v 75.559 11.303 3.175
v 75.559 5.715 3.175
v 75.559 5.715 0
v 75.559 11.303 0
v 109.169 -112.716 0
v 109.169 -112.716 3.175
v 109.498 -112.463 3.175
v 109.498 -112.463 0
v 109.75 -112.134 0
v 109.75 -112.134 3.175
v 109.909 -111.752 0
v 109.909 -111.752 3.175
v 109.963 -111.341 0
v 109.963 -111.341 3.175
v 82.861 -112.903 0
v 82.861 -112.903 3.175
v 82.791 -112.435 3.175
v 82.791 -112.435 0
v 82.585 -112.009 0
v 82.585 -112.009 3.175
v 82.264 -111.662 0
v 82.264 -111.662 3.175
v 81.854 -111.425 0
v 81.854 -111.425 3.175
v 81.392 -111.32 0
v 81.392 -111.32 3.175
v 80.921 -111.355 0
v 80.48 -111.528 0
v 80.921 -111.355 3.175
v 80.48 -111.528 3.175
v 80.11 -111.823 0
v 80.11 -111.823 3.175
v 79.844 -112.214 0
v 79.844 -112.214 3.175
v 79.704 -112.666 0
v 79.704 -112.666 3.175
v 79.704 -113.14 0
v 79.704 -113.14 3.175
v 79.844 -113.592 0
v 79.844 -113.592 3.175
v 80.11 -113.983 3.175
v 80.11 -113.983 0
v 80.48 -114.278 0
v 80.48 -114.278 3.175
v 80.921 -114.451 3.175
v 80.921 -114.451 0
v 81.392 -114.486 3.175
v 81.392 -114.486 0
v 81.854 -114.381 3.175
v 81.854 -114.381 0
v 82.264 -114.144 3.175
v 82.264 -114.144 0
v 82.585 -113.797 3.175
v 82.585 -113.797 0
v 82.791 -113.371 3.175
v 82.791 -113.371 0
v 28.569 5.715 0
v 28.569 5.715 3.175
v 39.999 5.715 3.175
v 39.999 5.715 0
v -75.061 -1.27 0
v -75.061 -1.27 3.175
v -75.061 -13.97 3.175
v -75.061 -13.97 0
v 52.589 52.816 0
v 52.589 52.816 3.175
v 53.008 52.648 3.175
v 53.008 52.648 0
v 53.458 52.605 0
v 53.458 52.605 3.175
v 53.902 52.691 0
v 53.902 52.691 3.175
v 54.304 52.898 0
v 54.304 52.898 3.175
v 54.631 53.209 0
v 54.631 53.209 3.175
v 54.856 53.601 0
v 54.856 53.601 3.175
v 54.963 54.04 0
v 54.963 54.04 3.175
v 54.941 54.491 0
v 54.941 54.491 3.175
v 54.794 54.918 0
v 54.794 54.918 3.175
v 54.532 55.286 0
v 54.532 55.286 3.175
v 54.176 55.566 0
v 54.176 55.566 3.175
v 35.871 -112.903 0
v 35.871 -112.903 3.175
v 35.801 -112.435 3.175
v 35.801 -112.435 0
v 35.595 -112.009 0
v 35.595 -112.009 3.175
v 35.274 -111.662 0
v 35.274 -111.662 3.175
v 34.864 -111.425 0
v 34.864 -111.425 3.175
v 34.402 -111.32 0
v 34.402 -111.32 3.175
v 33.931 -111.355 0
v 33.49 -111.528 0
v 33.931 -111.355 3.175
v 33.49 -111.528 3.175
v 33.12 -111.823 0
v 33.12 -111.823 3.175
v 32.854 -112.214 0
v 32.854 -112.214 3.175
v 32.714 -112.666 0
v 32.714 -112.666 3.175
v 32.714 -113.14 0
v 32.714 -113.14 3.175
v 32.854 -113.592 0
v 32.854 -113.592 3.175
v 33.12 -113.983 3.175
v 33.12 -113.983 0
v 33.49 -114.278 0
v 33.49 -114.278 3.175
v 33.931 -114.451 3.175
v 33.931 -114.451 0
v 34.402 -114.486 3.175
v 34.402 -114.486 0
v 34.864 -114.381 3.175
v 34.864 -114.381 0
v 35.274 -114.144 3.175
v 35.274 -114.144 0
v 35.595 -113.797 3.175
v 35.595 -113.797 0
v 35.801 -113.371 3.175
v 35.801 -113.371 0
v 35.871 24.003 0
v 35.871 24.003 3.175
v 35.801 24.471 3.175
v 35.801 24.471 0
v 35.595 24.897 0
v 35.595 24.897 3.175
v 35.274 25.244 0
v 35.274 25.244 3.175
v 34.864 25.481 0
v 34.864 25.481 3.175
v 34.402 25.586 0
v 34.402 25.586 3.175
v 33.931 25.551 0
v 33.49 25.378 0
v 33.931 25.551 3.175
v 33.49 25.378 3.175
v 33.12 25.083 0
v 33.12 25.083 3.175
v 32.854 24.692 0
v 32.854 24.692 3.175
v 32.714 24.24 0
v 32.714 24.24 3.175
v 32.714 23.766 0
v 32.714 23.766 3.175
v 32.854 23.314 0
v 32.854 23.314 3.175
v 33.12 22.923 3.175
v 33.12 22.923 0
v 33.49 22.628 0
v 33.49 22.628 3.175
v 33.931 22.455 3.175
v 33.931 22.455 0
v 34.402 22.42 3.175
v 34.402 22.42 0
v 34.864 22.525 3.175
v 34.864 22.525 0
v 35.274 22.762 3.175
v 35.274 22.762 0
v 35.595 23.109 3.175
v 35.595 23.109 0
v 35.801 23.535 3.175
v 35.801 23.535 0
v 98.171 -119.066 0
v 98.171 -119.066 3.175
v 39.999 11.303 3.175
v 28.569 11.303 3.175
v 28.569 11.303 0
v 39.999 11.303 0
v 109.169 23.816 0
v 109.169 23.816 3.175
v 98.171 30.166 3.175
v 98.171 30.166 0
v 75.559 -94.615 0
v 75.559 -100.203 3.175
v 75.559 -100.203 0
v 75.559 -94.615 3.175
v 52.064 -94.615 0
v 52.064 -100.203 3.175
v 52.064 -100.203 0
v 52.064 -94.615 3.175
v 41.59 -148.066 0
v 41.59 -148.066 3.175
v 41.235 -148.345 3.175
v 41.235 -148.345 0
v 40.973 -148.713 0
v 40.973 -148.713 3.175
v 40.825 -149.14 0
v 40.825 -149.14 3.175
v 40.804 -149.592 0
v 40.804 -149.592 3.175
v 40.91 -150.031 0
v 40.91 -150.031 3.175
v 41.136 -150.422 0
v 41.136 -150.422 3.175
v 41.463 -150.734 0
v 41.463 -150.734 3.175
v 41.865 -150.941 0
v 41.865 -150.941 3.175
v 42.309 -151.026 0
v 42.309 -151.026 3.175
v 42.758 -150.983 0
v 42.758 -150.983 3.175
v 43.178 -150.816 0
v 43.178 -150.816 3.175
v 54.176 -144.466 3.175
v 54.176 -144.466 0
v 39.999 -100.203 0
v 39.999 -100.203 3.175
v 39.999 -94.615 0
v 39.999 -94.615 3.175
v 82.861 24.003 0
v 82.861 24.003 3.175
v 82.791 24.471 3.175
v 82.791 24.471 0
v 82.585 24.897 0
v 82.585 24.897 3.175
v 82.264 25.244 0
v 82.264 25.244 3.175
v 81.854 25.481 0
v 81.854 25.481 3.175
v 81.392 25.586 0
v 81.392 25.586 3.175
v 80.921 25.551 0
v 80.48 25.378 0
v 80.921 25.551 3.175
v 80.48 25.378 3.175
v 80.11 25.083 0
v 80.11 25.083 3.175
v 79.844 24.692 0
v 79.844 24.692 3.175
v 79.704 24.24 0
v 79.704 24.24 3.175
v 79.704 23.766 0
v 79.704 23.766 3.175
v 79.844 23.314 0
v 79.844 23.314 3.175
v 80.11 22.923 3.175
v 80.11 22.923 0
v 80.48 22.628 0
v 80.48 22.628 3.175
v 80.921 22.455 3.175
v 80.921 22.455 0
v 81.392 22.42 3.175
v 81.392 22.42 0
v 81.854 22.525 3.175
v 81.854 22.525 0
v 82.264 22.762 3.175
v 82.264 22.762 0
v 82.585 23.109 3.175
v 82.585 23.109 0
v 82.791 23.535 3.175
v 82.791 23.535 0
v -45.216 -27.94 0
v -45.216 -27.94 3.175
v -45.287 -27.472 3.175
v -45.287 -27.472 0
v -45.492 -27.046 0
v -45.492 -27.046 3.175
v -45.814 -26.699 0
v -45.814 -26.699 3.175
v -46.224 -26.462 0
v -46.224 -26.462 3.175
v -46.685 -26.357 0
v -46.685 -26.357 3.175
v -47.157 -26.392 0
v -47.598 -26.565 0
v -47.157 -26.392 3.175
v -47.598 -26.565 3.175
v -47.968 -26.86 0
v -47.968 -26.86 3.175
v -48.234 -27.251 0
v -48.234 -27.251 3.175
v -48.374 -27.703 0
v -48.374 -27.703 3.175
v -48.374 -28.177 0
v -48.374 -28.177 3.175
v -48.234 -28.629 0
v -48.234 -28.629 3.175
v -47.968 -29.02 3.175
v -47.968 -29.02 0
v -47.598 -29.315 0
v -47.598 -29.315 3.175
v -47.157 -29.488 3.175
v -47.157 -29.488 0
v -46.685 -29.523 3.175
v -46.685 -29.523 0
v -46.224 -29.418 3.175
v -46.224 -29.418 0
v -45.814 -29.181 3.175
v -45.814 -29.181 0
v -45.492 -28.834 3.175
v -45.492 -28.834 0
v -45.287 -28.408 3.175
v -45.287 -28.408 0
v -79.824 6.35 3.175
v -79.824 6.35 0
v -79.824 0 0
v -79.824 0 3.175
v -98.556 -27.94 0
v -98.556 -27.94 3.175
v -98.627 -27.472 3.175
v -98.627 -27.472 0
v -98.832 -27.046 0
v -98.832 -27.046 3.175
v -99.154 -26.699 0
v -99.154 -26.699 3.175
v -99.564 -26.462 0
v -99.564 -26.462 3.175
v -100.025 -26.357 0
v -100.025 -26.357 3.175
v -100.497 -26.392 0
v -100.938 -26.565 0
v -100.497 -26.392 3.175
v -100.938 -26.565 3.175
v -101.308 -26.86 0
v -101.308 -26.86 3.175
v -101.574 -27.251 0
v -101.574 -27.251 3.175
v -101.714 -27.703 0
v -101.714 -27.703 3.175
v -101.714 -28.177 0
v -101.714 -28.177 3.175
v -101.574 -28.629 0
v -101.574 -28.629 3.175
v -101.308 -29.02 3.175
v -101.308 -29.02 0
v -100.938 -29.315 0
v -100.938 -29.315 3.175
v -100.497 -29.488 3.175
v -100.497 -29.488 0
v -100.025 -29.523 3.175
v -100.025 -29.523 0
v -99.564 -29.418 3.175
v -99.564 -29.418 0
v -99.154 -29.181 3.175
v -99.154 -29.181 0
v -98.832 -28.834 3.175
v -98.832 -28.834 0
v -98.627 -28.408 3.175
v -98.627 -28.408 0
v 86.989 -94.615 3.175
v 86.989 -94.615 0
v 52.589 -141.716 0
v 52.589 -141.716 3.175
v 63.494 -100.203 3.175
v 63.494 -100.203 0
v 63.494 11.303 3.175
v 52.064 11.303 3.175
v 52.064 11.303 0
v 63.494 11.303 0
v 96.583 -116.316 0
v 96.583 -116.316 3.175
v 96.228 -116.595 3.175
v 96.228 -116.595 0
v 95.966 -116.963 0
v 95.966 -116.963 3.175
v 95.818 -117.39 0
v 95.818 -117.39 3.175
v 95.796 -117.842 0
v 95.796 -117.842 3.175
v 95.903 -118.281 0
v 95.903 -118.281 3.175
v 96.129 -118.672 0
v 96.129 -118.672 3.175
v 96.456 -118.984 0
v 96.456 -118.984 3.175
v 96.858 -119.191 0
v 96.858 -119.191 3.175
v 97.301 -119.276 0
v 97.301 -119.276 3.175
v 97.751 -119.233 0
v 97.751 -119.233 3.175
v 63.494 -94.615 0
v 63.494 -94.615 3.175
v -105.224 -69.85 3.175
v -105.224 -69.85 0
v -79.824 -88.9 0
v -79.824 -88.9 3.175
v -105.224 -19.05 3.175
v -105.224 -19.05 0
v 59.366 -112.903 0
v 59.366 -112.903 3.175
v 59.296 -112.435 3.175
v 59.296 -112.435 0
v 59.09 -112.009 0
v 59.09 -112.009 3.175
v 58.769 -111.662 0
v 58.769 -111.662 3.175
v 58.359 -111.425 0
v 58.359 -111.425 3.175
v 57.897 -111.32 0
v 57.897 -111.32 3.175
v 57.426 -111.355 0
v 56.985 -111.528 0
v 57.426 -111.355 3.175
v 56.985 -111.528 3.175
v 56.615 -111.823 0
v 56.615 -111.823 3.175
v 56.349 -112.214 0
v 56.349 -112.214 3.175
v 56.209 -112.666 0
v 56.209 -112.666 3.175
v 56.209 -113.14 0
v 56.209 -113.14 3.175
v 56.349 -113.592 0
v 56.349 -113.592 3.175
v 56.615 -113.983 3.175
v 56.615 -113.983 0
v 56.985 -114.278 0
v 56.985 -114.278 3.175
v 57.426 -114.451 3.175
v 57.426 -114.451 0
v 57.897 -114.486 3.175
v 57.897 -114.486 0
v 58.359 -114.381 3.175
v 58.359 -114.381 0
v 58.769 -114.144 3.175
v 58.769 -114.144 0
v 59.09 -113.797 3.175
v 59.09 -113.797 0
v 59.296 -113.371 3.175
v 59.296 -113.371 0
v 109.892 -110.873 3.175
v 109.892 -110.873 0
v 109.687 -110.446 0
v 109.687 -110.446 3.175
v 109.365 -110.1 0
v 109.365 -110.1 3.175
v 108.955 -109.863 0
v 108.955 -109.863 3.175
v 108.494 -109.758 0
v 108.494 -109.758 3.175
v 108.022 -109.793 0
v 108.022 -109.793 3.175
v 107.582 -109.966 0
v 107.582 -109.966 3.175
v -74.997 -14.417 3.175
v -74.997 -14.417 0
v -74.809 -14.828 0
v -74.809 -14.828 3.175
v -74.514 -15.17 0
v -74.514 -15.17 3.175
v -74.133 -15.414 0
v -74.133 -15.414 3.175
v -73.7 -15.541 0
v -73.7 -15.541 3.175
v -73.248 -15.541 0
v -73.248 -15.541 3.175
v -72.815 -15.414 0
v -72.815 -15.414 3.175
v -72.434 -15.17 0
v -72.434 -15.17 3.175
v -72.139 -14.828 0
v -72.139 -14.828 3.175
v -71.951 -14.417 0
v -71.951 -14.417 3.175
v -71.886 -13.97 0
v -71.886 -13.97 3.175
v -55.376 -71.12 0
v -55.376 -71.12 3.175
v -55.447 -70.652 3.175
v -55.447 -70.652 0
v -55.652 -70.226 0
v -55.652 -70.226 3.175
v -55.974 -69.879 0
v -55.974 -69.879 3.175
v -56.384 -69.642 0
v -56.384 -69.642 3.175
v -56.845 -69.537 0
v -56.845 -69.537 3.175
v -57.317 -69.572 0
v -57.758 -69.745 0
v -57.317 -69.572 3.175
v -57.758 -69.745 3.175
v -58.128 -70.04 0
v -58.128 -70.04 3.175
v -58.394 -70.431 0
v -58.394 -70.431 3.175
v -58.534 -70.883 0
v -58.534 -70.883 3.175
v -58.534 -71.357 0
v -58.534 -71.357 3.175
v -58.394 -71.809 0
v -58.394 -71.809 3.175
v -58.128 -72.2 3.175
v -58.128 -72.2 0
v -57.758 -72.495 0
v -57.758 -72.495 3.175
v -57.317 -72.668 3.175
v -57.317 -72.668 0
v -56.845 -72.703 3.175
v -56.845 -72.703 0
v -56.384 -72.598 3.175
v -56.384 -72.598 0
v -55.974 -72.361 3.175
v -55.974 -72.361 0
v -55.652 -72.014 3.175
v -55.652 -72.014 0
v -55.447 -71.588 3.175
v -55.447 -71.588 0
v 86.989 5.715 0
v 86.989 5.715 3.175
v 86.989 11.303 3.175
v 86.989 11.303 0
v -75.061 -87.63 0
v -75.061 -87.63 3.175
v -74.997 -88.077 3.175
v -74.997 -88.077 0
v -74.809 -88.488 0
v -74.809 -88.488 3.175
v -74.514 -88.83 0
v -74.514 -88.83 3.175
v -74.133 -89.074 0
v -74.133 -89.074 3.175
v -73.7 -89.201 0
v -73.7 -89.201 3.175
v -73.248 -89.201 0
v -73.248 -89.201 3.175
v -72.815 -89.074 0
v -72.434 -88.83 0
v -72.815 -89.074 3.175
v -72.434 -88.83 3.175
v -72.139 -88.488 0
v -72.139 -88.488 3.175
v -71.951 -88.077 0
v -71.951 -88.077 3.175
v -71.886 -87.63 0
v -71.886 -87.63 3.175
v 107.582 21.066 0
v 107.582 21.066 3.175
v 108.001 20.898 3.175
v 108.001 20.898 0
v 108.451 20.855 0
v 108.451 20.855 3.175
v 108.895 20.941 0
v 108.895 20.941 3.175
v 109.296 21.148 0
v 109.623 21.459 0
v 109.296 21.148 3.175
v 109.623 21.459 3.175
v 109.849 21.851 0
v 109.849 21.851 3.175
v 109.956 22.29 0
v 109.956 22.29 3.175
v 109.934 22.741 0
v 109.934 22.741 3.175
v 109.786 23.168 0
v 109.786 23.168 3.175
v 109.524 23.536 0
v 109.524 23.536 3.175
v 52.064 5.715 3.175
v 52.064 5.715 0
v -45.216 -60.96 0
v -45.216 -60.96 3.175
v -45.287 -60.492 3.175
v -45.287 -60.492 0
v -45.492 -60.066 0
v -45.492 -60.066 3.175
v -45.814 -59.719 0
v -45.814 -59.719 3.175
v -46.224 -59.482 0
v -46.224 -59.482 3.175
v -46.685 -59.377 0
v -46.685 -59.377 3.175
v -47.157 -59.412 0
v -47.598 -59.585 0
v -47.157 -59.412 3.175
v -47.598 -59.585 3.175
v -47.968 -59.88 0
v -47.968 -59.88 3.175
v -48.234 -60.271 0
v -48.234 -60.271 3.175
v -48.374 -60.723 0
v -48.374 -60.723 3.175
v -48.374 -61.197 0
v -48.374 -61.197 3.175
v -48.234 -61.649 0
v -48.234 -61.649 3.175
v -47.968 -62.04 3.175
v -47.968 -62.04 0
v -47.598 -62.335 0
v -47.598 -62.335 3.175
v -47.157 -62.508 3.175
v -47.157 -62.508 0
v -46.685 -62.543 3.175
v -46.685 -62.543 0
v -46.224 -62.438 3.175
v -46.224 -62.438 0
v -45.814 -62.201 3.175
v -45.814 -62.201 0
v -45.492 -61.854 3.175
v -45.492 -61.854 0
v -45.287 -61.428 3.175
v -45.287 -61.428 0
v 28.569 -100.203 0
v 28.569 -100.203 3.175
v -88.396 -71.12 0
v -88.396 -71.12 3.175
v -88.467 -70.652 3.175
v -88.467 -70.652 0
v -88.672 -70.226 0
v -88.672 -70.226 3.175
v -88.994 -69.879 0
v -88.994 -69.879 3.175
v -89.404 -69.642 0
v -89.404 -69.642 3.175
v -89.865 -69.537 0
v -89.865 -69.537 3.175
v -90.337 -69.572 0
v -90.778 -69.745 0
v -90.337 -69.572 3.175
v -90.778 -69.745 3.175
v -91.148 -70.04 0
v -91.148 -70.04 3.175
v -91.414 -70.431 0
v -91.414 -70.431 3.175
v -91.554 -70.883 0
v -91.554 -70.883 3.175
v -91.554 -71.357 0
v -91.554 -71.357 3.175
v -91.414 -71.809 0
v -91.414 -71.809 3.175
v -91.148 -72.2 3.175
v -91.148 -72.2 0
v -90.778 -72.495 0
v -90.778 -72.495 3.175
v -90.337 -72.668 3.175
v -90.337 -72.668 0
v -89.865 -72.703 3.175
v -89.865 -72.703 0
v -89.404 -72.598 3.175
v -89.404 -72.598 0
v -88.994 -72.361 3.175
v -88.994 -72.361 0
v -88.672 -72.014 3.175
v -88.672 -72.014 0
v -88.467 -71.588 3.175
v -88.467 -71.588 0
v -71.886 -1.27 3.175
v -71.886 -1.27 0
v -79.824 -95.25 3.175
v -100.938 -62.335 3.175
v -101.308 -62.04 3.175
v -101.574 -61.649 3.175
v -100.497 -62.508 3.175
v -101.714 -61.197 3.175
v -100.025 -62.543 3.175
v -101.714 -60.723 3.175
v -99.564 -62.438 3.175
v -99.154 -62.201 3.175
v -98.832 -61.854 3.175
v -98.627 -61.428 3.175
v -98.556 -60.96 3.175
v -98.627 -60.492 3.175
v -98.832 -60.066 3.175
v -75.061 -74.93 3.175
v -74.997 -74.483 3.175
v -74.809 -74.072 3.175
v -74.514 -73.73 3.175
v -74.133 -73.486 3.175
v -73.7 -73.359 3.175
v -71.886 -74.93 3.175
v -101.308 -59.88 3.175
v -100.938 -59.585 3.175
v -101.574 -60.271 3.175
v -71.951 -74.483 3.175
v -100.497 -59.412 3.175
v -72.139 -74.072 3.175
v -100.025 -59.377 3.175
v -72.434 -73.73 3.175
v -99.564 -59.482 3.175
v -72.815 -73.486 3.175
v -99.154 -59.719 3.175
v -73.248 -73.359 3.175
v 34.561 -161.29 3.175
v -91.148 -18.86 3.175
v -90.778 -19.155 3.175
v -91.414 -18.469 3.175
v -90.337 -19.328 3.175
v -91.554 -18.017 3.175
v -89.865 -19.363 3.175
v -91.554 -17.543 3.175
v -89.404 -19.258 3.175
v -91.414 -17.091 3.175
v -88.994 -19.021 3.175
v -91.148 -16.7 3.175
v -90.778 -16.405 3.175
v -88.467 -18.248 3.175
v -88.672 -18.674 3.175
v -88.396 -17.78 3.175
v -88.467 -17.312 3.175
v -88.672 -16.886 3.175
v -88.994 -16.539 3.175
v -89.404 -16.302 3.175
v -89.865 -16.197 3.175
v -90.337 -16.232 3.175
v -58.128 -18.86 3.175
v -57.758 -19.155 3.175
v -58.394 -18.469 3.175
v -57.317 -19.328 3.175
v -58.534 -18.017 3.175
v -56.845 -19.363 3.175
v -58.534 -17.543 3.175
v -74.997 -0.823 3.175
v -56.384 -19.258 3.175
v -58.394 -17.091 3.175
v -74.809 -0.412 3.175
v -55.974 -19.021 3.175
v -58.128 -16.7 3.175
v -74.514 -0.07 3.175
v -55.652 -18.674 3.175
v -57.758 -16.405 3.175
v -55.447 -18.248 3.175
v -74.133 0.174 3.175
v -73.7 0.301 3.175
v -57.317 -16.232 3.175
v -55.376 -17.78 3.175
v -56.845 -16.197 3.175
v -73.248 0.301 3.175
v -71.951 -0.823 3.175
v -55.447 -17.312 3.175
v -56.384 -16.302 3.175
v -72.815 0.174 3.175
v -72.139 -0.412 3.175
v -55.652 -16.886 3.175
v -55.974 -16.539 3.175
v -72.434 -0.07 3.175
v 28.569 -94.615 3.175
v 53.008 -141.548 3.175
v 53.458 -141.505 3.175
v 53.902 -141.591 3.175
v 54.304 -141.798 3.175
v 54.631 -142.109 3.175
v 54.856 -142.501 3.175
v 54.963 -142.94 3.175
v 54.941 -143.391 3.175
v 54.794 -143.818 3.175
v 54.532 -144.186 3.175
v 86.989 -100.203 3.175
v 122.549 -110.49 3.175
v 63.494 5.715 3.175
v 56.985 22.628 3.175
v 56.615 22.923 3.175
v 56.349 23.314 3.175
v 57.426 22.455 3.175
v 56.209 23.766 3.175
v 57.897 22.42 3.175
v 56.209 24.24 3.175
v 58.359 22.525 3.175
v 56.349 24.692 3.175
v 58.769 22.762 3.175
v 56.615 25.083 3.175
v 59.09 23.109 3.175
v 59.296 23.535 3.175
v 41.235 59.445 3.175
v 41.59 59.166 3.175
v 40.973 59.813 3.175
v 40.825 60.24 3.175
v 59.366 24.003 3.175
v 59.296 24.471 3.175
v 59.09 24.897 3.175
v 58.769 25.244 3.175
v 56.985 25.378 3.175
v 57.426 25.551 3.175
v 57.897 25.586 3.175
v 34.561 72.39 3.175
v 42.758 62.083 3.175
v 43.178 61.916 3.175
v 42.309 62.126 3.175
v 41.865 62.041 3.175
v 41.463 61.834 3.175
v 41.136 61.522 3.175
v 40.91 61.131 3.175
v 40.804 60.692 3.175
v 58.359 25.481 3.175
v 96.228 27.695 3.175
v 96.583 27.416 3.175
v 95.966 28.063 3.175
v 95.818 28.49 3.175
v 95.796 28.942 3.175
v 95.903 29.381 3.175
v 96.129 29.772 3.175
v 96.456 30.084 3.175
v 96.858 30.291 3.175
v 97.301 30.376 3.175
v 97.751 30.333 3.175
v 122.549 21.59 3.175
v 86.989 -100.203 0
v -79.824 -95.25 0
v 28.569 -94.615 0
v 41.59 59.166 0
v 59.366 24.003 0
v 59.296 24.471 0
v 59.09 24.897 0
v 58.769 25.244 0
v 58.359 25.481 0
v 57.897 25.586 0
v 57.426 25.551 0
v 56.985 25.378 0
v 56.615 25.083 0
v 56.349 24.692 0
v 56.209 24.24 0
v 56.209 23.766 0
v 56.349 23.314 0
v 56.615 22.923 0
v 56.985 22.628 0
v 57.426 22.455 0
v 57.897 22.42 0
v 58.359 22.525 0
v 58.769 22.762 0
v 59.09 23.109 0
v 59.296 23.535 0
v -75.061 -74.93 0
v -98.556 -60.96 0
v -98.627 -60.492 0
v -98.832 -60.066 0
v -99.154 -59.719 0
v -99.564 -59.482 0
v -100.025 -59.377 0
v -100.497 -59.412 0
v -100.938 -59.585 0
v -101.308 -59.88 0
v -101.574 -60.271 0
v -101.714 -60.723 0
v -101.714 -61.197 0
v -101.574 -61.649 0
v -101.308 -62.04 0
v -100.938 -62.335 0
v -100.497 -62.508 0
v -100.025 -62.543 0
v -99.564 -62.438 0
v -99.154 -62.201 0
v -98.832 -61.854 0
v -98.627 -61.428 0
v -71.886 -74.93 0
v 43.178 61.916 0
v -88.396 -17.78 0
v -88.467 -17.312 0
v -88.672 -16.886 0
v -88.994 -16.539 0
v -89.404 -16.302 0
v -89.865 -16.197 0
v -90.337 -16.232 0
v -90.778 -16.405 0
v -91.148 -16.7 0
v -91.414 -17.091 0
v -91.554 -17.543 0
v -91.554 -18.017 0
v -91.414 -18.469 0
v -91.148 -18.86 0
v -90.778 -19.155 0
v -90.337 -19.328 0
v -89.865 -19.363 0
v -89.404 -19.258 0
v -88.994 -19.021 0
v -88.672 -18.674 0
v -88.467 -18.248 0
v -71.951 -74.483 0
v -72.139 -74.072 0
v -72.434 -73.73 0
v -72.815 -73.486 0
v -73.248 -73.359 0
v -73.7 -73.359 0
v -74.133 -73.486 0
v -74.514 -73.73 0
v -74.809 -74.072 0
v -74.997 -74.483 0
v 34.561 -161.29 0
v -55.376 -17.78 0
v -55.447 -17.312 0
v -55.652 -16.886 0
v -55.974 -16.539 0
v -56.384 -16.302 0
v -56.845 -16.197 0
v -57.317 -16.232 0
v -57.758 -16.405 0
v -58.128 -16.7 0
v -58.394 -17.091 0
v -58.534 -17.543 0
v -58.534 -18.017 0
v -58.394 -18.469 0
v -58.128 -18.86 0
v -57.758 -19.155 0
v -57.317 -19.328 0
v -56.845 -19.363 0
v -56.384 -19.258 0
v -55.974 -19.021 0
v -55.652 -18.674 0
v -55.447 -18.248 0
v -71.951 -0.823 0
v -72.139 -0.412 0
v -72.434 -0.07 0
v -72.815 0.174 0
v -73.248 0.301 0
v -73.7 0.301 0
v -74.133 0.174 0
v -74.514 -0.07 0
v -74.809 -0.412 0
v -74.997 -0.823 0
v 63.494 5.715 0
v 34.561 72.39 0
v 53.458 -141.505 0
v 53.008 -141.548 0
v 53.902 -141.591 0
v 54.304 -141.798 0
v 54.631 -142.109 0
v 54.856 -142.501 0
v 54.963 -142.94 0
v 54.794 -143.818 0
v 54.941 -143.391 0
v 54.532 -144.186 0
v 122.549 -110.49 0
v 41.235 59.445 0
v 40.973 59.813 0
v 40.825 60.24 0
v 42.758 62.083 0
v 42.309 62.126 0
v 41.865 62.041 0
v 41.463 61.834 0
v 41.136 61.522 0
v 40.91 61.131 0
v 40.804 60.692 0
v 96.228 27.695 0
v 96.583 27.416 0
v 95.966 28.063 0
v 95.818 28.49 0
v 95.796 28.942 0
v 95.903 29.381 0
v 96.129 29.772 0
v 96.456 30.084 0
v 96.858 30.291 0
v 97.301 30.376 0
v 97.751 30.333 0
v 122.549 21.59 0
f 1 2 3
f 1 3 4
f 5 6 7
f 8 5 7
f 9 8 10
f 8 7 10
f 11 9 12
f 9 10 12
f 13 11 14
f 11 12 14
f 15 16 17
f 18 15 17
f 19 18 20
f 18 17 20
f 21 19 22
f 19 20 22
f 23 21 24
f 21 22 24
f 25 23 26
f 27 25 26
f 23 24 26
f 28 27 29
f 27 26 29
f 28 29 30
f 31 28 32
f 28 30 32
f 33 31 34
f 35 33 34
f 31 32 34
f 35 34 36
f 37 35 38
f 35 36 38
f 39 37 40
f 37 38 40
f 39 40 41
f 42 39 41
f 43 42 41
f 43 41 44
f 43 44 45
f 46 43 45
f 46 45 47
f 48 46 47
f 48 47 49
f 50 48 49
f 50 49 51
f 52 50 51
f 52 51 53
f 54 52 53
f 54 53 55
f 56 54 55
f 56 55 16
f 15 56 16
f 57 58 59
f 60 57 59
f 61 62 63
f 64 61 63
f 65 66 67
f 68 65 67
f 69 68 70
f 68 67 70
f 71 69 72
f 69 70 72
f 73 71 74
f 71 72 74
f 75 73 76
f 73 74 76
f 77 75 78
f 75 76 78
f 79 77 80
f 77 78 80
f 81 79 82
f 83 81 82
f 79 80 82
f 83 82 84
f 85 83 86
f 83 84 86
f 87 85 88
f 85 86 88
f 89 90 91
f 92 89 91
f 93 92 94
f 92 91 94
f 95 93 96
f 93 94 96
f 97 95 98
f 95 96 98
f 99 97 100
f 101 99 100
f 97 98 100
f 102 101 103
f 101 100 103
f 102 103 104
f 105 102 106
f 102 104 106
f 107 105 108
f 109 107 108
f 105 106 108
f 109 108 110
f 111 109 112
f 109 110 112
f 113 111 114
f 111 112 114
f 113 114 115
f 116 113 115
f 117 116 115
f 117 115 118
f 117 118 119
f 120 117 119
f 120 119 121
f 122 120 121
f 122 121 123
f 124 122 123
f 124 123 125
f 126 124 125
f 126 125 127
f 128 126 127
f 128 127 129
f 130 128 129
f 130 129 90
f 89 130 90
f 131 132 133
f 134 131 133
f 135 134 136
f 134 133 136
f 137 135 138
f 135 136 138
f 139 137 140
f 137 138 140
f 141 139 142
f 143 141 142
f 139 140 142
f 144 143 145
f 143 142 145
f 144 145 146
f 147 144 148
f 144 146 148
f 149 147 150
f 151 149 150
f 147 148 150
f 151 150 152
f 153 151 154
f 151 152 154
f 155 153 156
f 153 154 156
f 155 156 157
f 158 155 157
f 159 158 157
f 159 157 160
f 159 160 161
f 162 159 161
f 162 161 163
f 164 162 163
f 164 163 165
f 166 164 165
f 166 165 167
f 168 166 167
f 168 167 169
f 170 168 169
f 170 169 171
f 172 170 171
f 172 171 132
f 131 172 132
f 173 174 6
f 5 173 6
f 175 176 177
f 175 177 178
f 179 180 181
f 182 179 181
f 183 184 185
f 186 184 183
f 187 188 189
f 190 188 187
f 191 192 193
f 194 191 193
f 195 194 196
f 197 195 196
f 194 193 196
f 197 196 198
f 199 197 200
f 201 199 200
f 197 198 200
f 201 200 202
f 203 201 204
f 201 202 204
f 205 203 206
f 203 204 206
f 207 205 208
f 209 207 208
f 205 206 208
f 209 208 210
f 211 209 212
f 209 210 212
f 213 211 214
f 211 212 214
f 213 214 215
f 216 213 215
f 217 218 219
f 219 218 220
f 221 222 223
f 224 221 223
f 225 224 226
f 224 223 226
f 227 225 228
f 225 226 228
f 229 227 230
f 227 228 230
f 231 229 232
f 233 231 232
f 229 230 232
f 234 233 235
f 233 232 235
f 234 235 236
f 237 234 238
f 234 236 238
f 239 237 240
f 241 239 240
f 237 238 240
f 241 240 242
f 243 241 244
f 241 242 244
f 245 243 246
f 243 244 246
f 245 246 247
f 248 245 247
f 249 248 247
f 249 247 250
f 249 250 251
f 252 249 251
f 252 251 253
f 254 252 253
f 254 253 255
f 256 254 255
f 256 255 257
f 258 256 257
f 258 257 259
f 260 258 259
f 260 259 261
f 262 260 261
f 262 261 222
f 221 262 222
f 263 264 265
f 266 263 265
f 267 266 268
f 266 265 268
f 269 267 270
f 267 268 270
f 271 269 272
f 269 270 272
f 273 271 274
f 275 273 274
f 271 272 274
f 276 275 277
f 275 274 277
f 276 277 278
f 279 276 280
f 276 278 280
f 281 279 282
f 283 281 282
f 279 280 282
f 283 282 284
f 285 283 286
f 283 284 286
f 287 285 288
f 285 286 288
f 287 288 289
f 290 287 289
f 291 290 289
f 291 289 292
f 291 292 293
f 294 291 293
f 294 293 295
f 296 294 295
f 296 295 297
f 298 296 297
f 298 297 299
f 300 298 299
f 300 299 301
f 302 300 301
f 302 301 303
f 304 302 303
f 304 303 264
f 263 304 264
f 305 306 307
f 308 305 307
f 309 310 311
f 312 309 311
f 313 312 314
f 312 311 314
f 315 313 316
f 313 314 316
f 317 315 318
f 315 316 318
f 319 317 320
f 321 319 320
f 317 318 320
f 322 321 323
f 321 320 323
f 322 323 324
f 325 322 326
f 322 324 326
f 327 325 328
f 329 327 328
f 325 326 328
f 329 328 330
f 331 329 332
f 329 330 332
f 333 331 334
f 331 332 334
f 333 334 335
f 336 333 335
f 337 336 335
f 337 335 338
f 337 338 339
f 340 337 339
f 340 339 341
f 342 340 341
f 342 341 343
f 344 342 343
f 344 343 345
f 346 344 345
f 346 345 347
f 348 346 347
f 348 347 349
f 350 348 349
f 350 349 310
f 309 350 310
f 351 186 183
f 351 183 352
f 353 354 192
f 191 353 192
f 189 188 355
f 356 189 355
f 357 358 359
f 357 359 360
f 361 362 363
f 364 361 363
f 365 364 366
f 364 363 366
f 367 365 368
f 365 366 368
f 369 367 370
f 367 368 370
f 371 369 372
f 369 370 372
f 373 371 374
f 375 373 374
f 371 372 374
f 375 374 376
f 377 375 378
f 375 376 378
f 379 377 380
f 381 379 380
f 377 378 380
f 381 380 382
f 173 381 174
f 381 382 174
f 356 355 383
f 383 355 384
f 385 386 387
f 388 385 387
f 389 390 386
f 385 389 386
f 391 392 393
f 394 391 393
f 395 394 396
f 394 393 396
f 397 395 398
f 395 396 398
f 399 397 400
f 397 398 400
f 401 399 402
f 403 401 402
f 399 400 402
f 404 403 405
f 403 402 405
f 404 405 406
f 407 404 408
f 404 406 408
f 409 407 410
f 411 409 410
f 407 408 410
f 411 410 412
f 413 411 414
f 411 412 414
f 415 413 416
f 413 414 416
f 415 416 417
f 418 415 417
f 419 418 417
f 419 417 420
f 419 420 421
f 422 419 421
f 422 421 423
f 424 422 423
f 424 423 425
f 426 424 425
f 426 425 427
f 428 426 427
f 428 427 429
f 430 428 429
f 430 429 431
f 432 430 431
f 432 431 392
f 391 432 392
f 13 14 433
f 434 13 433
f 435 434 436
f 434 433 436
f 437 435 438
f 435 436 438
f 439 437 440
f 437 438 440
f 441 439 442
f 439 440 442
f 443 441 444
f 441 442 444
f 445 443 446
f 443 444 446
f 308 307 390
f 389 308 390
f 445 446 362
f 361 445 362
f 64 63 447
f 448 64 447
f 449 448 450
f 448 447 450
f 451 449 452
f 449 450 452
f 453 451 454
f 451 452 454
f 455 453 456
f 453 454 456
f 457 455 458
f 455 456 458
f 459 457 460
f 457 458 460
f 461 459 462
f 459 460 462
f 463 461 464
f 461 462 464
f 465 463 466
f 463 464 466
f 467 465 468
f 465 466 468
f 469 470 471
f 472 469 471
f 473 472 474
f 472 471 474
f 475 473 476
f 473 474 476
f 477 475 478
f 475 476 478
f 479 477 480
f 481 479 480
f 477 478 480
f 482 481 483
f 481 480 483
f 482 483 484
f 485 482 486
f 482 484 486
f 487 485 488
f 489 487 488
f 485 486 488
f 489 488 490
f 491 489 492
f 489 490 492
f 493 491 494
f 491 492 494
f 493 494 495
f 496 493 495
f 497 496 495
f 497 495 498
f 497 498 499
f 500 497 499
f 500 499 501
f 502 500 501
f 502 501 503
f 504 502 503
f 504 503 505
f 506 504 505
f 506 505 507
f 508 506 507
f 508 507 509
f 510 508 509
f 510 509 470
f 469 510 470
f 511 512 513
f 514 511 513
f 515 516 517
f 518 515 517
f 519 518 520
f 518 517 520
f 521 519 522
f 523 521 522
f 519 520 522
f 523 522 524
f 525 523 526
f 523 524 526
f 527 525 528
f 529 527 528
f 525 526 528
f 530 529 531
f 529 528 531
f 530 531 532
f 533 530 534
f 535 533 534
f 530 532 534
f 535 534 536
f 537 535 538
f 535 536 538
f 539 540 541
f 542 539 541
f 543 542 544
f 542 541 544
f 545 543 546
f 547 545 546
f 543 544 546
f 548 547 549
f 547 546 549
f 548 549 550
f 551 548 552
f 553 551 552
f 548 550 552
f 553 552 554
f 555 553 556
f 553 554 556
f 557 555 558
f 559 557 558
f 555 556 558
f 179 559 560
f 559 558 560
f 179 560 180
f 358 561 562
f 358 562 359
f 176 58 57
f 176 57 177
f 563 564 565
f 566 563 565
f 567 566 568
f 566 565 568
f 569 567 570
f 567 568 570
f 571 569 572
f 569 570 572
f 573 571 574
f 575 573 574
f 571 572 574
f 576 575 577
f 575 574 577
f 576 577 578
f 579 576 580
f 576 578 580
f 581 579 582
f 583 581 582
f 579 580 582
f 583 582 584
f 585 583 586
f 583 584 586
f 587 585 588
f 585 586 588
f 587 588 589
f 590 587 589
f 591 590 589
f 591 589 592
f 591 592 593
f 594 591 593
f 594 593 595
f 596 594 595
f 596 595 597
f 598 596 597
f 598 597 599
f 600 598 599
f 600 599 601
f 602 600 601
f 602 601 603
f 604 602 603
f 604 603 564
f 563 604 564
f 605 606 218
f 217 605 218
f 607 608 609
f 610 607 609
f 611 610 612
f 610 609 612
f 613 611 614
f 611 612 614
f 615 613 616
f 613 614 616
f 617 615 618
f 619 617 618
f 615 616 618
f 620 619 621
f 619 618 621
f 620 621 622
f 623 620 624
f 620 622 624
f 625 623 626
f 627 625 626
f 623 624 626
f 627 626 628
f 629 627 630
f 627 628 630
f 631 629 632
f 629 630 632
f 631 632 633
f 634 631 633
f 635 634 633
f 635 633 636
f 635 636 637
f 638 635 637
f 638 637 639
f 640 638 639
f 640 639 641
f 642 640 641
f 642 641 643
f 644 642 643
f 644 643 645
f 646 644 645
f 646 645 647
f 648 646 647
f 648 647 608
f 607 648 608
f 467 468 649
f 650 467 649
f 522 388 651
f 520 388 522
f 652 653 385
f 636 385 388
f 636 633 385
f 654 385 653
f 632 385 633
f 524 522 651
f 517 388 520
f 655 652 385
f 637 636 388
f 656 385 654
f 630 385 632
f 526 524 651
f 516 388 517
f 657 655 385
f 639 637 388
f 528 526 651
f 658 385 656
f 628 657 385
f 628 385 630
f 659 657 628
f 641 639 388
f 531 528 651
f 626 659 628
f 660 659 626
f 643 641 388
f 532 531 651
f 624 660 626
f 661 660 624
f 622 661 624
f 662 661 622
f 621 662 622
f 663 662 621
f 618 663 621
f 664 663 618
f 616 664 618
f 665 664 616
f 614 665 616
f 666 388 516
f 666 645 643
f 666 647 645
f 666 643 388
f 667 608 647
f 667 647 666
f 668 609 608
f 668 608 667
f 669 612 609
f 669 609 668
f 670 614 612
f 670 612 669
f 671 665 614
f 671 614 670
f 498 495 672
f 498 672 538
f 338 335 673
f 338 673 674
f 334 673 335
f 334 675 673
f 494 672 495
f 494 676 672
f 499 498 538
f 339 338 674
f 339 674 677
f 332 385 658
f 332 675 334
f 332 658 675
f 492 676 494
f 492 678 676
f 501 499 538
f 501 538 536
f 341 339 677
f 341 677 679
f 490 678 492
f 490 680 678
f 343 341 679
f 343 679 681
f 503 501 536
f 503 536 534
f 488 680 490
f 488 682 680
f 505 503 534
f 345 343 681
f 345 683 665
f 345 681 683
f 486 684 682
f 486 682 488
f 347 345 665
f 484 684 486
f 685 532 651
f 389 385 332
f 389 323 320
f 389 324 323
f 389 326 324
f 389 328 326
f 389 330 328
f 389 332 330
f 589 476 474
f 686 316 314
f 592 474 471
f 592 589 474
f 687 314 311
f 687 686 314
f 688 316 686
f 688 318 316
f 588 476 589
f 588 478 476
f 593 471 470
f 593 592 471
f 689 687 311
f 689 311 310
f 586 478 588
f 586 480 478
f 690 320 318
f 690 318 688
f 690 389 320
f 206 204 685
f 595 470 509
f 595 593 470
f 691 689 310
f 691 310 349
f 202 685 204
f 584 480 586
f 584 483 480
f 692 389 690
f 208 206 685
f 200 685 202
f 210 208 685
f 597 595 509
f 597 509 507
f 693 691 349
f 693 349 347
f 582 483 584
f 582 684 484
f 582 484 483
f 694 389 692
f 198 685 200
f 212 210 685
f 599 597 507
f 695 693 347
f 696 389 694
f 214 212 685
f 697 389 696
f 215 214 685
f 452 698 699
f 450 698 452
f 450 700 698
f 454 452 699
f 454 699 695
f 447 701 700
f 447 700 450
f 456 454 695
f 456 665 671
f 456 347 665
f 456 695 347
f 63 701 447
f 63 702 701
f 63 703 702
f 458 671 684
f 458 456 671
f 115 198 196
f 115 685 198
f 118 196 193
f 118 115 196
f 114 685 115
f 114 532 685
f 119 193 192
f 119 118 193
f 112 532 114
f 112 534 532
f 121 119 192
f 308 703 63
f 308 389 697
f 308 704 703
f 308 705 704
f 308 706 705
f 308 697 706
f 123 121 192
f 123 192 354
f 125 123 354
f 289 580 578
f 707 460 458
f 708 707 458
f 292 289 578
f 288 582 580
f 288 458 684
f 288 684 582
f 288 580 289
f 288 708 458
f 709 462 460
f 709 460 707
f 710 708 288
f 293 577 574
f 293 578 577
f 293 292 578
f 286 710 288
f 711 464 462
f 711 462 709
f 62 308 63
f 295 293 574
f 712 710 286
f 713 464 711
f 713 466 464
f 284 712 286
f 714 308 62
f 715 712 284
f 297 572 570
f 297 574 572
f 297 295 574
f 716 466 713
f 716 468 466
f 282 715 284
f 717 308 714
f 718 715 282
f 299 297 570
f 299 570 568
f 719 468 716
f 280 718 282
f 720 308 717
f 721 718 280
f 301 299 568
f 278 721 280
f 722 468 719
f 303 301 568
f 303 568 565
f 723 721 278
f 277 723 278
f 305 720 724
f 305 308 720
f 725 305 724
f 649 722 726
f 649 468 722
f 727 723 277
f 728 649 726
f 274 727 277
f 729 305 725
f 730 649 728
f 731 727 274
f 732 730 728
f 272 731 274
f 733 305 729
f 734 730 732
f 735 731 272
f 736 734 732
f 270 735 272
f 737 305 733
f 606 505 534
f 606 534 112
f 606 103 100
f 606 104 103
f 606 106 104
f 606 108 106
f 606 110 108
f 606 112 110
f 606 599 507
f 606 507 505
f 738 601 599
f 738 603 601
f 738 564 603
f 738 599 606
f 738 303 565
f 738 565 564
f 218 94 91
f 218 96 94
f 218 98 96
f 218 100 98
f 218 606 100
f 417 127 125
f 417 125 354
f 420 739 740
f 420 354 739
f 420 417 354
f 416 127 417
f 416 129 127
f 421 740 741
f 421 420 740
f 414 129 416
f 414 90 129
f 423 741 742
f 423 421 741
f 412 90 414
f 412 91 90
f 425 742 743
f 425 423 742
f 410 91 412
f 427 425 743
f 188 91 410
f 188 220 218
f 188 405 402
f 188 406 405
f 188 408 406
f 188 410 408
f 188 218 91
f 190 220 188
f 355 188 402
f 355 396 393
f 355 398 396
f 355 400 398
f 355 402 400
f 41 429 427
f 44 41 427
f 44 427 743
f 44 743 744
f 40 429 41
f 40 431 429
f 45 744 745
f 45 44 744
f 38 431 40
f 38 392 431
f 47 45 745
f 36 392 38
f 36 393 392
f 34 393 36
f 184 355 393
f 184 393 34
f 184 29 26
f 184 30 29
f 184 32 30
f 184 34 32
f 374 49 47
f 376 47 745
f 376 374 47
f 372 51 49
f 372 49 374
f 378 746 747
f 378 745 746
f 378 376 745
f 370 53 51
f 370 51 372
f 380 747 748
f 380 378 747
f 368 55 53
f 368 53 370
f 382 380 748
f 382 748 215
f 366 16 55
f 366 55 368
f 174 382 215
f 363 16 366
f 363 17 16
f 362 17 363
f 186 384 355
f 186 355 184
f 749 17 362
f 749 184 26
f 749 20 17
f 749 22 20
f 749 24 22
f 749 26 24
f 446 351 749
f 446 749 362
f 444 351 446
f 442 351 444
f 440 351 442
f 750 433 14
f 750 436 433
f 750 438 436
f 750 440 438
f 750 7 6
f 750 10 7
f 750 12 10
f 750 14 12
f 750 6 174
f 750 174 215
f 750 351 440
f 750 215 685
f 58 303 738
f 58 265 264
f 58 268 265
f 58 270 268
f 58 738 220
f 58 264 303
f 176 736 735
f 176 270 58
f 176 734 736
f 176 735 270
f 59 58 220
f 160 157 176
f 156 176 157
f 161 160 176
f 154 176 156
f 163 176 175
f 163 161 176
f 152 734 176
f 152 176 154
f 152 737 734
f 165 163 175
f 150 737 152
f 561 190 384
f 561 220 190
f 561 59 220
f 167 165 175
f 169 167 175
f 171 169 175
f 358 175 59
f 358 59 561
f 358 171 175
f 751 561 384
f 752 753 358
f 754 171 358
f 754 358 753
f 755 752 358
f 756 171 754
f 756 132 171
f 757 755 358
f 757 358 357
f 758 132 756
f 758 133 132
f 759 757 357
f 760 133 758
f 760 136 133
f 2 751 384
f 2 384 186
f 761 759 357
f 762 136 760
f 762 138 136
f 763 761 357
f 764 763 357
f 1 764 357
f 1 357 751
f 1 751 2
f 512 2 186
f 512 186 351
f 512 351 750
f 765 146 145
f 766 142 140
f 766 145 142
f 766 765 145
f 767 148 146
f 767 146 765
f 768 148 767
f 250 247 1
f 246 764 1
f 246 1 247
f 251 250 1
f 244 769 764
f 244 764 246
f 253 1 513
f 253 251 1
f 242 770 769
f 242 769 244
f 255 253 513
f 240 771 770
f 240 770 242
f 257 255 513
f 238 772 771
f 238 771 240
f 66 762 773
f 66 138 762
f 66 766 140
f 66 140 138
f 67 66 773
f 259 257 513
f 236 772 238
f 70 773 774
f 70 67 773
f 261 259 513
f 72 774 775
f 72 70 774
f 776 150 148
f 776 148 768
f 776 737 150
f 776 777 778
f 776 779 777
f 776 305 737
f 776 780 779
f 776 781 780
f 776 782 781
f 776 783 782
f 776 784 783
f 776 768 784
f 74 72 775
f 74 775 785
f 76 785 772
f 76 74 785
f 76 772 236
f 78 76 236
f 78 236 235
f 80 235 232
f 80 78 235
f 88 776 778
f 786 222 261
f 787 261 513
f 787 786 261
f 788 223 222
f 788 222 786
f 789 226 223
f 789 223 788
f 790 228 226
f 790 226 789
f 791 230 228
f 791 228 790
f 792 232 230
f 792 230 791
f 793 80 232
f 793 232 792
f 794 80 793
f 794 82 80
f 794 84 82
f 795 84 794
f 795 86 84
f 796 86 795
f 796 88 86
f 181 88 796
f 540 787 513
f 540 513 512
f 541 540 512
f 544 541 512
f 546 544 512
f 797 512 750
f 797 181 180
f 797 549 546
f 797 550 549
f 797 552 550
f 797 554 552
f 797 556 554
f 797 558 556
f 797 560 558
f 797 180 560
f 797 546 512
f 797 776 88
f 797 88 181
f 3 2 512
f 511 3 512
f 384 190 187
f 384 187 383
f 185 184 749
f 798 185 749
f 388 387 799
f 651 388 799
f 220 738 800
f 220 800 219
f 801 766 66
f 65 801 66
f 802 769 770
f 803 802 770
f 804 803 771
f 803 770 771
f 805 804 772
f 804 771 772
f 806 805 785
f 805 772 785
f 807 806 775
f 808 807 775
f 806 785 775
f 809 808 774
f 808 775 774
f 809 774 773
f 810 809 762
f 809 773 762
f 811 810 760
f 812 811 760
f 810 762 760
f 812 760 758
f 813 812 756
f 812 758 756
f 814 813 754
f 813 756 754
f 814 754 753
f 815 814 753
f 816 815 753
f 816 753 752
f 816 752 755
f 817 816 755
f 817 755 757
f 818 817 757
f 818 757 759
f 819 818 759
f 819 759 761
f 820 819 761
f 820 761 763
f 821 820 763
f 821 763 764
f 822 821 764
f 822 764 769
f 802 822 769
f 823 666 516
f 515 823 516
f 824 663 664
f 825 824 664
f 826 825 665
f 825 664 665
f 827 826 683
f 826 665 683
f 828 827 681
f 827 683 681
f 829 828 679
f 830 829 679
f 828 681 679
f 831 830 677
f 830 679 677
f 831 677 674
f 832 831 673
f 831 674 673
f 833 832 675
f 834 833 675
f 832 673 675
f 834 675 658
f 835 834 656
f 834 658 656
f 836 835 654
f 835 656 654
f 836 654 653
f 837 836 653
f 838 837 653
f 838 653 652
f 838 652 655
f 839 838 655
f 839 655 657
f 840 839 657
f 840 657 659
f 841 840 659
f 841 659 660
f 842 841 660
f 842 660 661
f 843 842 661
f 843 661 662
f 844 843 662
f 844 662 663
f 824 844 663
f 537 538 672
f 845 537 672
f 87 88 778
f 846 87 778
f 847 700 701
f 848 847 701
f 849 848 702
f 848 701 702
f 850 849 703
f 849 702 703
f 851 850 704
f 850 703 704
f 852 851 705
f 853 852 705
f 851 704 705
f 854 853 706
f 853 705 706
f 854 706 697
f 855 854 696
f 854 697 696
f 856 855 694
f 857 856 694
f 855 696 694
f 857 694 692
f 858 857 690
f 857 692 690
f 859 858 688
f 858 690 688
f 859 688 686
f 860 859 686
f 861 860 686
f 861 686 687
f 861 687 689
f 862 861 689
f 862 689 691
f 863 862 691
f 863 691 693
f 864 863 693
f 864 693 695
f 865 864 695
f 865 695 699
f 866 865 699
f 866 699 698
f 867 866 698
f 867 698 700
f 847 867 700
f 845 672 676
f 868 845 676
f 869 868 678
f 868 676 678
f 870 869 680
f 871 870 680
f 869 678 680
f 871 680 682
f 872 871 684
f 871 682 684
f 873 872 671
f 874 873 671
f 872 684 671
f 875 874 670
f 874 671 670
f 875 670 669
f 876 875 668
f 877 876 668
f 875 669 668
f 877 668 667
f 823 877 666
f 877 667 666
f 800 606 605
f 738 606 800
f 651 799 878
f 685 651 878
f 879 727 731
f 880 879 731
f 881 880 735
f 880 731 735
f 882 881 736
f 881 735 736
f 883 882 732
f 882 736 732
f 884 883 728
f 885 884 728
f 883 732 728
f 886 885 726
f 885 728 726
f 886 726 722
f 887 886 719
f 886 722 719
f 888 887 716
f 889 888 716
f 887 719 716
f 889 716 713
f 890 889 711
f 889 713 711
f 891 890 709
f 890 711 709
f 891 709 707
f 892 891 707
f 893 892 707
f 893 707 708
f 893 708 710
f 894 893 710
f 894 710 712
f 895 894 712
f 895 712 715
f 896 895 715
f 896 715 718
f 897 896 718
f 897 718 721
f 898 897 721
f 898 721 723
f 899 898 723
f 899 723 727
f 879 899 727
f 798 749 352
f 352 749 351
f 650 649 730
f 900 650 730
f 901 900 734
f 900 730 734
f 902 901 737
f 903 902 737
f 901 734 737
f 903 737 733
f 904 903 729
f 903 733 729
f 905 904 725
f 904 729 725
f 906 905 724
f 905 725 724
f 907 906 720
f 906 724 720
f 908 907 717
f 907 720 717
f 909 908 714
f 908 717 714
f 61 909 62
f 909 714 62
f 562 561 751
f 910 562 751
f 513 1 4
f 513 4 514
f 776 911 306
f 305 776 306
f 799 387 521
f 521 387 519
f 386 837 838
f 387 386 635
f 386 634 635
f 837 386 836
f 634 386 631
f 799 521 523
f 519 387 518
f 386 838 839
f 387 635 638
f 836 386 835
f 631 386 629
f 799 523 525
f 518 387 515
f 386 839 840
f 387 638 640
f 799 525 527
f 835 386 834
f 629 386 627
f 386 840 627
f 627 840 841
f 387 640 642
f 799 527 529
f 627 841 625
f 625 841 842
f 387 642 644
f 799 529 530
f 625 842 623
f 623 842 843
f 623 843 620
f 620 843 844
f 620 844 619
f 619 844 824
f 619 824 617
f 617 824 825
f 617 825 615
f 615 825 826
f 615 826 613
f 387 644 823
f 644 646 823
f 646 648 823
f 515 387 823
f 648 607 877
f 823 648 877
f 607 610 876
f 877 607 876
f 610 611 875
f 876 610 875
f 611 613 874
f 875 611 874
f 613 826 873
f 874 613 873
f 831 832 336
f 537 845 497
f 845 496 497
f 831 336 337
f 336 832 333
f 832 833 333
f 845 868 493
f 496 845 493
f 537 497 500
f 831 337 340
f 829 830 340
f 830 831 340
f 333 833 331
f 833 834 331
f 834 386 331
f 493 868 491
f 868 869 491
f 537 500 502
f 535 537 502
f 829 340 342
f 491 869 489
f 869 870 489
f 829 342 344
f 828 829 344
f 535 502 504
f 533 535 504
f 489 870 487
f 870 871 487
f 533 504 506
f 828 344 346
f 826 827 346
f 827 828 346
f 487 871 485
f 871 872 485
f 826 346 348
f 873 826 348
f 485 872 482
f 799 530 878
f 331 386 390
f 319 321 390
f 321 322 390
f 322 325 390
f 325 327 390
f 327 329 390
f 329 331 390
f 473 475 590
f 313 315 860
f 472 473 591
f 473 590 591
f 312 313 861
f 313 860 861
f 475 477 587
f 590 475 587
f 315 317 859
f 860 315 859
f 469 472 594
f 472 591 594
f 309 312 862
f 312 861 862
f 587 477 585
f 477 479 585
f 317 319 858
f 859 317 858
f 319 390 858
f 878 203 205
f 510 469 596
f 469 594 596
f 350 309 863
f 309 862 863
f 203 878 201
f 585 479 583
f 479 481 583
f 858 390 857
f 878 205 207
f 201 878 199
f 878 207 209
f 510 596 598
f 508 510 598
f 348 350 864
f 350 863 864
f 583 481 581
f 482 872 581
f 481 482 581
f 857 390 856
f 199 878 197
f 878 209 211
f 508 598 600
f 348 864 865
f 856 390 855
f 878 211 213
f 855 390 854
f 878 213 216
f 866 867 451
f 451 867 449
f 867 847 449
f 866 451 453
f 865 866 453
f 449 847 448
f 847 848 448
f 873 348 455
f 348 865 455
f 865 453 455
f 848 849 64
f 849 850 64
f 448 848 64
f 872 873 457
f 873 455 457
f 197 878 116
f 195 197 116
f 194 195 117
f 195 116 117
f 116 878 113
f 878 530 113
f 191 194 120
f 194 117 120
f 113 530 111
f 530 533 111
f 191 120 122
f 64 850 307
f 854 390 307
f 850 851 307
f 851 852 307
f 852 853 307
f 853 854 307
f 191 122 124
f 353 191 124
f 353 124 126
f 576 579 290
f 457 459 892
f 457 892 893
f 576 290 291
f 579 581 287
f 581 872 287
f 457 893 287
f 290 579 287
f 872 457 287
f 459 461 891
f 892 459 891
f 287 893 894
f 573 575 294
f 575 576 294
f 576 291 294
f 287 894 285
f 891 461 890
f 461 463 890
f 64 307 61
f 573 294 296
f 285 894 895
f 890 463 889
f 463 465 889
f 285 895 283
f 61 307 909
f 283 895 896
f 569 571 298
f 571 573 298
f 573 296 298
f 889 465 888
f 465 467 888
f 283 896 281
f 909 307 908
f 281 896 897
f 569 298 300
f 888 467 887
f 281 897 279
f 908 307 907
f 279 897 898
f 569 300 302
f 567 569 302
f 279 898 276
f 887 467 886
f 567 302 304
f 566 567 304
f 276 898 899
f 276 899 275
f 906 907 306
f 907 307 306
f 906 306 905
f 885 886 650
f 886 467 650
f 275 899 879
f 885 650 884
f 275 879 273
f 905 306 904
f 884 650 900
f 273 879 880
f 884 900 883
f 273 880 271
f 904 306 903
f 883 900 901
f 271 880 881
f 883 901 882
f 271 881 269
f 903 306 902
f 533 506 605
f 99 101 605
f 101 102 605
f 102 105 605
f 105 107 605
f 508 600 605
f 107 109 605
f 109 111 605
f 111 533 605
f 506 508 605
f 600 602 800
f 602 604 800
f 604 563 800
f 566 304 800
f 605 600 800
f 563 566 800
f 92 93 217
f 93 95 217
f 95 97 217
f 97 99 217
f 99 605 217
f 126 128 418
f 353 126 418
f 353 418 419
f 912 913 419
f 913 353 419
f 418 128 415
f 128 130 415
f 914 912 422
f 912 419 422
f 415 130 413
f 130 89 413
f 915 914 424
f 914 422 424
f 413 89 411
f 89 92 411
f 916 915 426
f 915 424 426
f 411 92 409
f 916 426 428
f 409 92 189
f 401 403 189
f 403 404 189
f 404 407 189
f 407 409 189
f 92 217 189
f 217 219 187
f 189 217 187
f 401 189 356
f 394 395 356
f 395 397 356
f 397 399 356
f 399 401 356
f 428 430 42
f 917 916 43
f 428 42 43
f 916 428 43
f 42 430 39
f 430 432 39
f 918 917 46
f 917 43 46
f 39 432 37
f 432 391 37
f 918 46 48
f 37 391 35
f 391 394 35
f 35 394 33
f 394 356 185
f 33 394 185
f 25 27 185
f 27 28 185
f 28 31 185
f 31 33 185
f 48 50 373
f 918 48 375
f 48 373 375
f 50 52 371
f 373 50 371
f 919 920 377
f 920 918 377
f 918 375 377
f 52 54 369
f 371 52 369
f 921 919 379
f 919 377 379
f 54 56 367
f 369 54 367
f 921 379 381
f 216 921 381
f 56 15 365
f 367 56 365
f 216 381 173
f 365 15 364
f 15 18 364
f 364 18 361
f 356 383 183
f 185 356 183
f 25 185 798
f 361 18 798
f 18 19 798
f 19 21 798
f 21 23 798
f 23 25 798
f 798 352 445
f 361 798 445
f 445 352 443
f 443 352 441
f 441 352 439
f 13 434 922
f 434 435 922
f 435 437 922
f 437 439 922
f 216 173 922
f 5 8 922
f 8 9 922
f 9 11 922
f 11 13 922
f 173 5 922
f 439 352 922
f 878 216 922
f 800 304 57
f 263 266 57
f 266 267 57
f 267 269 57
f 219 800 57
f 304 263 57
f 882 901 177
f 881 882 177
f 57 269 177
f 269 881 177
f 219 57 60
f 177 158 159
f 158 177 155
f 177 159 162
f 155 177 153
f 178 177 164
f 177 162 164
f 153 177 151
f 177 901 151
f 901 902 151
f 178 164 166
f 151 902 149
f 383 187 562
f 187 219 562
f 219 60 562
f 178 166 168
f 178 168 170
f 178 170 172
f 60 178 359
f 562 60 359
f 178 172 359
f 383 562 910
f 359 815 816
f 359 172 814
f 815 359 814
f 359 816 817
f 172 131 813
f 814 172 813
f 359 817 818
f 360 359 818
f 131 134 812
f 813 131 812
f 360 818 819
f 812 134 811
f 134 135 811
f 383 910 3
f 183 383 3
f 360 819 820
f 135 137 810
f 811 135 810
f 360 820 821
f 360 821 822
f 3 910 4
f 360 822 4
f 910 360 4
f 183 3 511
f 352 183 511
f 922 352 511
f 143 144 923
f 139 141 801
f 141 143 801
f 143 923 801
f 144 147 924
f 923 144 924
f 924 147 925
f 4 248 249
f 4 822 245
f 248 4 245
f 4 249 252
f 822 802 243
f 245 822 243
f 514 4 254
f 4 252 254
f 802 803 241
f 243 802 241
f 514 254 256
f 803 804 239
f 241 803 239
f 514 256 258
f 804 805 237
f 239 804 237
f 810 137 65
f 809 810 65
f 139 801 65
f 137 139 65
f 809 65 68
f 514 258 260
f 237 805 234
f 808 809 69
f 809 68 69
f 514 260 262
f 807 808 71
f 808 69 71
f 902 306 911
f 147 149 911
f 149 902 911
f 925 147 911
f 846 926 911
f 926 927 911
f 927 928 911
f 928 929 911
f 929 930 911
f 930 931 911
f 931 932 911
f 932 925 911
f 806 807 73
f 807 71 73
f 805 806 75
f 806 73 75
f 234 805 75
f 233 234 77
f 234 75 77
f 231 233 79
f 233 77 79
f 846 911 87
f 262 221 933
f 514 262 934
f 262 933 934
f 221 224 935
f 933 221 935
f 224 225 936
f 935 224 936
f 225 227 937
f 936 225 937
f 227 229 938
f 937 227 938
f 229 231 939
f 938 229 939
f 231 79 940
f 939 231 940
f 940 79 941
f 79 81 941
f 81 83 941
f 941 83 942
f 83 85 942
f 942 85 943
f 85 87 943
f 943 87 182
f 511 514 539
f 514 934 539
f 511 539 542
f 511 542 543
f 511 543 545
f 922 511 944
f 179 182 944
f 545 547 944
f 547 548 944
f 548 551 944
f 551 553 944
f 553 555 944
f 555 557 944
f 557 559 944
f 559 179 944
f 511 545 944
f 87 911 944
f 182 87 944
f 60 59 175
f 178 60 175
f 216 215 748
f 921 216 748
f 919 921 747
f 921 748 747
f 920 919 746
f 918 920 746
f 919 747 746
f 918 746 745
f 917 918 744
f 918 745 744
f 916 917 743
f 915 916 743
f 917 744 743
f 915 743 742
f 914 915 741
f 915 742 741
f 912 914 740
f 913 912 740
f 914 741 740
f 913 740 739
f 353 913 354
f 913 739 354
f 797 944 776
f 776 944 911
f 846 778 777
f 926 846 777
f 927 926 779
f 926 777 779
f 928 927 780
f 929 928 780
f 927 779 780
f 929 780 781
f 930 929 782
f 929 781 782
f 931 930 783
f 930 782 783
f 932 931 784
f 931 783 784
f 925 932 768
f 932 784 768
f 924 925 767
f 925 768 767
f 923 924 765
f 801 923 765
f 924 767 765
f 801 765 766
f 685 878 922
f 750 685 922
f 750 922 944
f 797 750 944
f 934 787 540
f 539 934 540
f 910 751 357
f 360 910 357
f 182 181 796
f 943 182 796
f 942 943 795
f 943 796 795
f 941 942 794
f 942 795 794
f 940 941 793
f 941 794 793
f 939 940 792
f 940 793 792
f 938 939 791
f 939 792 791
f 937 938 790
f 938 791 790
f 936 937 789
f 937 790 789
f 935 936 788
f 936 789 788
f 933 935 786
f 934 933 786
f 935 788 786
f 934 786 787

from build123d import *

# Parameters (mm, degrees)
F1_DEPTH = 3.175
F2_R     = 1.5875
F2_W     = 11.43
F2_H     = 5.588
F3_DEPTH = 25.4


with BuildPart() as f1:
    # F0 (on Top) → F1 (new body)
    with BuildSketch(Plane.XY):
        Polygon((-79.823994, 0), (-105.223994, -19.05), (-105.223994, -69.85), (-79.823994, -88.9), (-79.823994, -95.25), (34.560641, -161.29), (122.548823, -110.49), (122.548823, 21.59), (34.560641, 72.39), (-79.823994, 6.35), align=None)
    extrude(amount=F1_DEPTH)

    # F2 (on face) → F3 (cut)
    with BuildSketch(Plane.XY.offset(3.175)):
        with Locations((-100.143994, -27.94)):
            Circle(F2_R)
        with Locations((-89.983994, -17.78)):
            Circle(F2_R)
        with Locations((-56.963994, -17.78)):
            Circle(F2_R)
        with Locations((-46.803994, -27.94)):
            Circle(F2_R)
        with Locations((-46.803994, -60.96)):
            Circle(F2_R)
        with Locations((-56.963994, -71.12)):
            Circle(F2_R)
        with Locations((-89.983994, -71.12)):
            Circle(F2_R)
        with Locations((-100.143994, -60.96)):
            Circle(F2_R)
        with BuildLine():
            Line((-75.061494, -74.93), (-75.061494, -87.63))
            ThreePointArc((-75.061494, -87.63), (-73.473994, -89.2175), (-71.886494, -87.63))
            Line((-71.886494, -87.63), (-71.886494, -74.93))
            ThreePointArc((-71.886494, -74.93), (-73.473994, -73.3425), (-75.061494, -74.93))
        make_face()
        with BuildLine():
            Line((-71.886494, -13.97), (-71.886494, -1.27))
            ThreePointArc((-71.886494, -1.27), (-73.473994, 0.3175), (-75.061494, -1.27))
            Line((-75.061494, -1.27), (-75.061494, -13.97))
            ThreePointArc((-75.061494, -13.97), (-73.473994, -15.5575), (-71.886494, -13.97))
        make_face()
        with Locations((34.283823, 8.509)):
            Rectangle(F2_W, F2_H)
        with Locations((57.778823, 8.509)):
            Rectangle(F2_W, F2_H)
        with Locations((81.273823, 8.509)):
            Rectangle(F2_W, F2_H)
        with Locations((57.778823, 24.003)):
            Circle(F2_R)
        with Locations((34.283823, 24.003)):
            Circle(F2_R)
        with Locations((81.273823, -97.409)):
            Rectangle(F2_W, F2_H)
        with Locations((57.778823, -97.409)):
            Rectangle(F2_W, F2_H)
        with Locations((34.283823, -97.409)):
            Rectangle(F2_W, F2_H)
        with Locations((34.283823, -112.903)):
            Circle(F2_R)
        with Locations((57.778823, -112.903)):
            Circle(F2_R)
        with Locations((81.273823, -112.903)):
            Circle(F2_R)
        with BuildLine():
            ThreePointArc((109.16905, -112.715554), (107.000485, -112.134489), (107.58155, -109.965923))
            Line((107.58155, -109.965923), (96.583027, -116.315923))
            ThreePointArc((96.583027, -116.315923), (98.170527, -116.315923), (98.964277, -117.690739))
            ThreePointArc((98.964277, -117.690739), (98.751593, -118.484489), (98.170527, -119.065554))
            Line((98.170527, -119.065554), (109.16905, -112.715554))
        make_face()
        with BuildLine():
            ThreePointArc((98.964277, -117.690739), (98.170527, -116.315923), (96.583027, -116.315923))
            ThreePointArc((96.583027, -116.315923), (96.001962, -118.484489), (98.170527, -119.065554))
            ThreePointArc((98.170527, -119.065554), (98.751593, -118.484489), (98.964277, -117.690739))
        make_face()
        with BuildLine():
            ThreePointArc((109.16905, -112.715554), (109.750115, -112.134489), (109.9628, -111.340739))
            ThreePointArc((109.9628, -111.340739), (109.16905, -109.965923), (107.58155, -109.965923))
            ThreePointArc((107.58155, -109.965923), (107.000485, -112.134489), (109.16905, -112.715554))
        make_face()
        with BuildLine():
            Line((52.588937, -141.715923), (41.590414, -148.065923))
            ThreePointArc((41.590414, -148.065923), (41.009349, -150.234489), (43.177914, -150.815554))
            Line((43.177914, -150.815554), (54.176437, -144.465554))
            ThreePointArc((54.176437, -144.465554), (54.757502, -142.296989), (52.588937, -141.715923))
        make_face()
        with BuildLine():
            Line((96.583027, 27.415923), (107.58155, 21.065923))
            ThreePointArc((107.58155, 21.065923), (109.750115, 21.646989), (109.16905, 23.815554))
            Line((109.16905, 23.815554), (98.170527, 30.165554))
            ThreePointArc((98.170527, 30.165554), (96.001962, 29.584489), (96.583027, 27.415923))
        make_face()
        with BuildLine():
            Line((54.176437, 55.565554), (43.177914, 61.915554))
            ThreePointArc((43.177914, 61.915554), (41.009349, 61.334489), (41.590414, 59.165923))
            Line((41.590414, 59.165923), (52.588937, 52.815923))
            ThreePointArc((52.588937, 52.815923), (54.757502, 53.396989), (54.176437, 55.565554))
        make_face()
        with Locations((81.273823, 24.003)):
            Circle(F2_R)
    extrude(amount=-F3_DEPTH, mode=Mode.SUBTRACT)


solid = f1.part
